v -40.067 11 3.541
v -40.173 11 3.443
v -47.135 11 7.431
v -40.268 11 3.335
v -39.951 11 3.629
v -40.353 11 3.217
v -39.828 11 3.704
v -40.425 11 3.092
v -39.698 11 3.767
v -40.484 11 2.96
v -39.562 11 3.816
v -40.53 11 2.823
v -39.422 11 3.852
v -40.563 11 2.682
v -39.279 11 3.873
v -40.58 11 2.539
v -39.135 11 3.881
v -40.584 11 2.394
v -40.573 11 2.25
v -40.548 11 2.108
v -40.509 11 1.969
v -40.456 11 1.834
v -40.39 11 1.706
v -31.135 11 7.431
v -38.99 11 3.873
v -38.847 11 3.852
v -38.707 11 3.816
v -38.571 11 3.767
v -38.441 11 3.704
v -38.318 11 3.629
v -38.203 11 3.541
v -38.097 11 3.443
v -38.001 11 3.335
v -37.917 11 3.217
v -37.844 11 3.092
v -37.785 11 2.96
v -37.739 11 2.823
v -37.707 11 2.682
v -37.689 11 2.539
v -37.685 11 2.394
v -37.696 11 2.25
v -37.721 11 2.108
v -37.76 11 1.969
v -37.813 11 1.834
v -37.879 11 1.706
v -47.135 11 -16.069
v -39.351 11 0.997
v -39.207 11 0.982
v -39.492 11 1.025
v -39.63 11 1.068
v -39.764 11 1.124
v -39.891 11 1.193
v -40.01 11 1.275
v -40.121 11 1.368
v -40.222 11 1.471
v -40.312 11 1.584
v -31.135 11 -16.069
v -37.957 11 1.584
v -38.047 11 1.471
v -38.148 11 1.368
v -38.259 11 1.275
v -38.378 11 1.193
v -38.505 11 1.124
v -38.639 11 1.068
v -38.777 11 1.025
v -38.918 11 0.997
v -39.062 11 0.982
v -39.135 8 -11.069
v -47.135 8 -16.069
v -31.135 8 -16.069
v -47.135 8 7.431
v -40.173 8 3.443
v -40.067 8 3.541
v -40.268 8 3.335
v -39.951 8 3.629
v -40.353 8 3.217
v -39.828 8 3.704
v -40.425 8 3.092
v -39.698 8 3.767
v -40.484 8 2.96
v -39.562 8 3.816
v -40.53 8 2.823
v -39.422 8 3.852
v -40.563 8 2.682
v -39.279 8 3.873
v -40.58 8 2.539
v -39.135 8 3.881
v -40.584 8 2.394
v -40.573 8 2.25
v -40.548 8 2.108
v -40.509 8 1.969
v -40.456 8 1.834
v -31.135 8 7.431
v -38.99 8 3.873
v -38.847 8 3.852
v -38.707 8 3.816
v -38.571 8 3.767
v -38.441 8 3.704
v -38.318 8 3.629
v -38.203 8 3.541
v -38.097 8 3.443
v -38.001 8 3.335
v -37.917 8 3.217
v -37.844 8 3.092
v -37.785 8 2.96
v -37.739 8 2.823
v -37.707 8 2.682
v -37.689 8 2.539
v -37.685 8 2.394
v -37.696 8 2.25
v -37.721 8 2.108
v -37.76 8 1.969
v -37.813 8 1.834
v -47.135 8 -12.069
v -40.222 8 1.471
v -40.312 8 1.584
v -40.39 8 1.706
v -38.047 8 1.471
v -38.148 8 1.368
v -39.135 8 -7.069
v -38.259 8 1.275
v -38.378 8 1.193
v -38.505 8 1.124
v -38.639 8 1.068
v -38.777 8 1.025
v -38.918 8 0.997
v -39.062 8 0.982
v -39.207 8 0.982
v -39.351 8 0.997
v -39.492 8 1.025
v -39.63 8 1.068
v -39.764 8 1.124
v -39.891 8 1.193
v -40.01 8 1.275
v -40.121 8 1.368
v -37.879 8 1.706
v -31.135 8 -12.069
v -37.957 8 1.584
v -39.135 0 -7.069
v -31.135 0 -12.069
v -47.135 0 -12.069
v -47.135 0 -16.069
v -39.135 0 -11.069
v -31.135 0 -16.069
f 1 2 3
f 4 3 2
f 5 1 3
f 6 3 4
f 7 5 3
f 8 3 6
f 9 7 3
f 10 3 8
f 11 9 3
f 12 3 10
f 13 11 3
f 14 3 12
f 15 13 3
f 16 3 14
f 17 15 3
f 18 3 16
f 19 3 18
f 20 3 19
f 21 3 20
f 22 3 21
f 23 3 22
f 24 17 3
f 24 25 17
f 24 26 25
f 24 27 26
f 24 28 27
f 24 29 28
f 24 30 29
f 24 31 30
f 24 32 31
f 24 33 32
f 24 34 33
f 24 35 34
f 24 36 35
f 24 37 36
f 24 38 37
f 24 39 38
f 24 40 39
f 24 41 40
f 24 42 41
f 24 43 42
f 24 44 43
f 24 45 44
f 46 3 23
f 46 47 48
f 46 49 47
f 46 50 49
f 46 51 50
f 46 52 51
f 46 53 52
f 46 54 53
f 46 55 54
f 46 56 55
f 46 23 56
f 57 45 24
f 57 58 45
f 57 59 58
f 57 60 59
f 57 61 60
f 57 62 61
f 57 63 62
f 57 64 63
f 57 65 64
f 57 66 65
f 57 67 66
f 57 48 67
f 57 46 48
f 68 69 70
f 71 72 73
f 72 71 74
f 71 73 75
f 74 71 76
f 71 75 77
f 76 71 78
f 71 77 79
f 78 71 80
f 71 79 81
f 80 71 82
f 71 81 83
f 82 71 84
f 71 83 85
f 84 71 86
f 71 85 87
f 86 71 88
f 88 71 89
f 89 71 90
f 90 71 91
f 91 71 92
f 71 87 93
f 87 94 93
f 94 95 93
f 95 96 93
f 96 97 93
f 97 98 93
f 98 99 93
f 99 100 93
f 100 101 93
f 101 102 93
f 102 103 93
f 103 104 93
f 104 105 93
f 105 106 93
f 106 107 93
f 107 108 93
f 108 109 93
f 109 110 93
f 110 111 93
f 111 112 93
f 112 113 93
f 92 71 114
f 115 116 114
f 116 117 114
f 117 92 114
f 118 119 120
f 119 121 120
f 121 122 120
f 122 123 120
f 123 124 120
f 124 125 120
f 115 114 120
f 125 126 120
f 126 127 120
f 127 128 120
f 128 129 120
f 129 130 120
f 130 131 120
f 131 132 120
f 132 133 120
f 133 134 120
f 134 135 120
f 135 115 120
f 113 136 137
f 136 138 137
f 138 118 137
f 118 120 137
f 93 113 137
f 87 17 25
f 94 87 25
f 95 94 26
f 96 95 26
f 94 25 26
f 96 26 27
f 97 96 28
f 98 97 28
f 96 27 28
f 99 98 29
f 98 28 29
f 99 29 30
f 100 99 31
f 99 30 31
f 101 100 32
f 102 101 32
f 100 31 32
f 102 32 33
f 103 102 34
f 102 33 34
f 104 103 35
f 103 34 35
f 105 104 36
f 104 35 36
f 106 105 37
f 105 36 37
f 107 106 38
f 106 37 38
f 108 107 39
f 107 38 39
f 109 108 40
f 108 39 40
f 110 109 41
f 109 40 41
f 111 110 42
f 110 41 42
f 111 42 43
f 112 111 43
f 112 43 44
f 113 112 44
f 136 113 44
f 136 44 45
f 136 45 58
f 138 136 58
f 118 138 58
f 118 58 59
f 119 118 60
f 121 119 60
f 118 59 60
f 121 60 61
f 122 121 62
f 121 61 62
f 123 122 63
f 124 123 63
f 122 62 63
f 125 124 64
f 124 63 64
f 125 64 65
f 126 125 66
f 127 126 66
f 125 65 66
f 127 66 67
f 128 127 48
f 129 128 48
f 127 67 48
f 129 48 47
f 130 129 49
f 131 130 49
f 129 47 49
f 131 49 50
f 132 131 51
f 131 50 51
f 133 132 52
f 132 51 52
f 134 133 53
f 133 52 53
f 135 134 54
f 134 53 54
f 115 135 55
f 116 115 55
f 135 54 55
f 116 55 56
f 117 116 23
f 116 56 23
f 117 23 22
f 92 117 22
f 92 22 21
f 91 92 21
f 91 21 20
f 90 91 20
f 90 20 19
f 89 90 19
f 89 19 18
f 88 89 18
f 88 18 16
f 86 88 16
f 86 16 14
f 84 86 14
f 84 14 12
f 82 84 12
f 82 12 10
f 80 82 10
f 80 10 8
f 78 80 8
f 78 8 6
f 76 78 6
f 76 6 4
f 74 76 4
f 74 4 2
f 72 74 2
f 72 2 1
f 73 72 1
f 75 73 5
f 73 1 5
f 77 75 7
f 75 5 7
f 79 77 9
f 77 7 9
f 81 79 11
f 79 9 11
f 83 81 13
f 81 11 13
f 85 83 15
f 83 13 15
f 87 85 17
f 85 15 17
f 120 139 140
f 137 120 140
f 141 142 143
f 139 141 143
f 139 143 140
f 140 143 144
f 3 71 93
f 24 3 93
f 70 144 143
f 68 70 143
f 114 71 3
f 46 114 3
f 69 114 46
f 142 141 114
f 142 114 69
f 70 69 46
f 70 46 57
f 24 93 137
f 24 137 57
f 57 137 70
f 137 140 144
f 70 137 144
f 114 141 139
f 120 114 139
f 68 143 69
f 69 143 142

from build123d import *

# Parameters (mm, degrees)
BOSS_EXTRUDE1_DEPTH = 8
SKETCH2_W           = 16
SKETCH2_H           = 23.5
BOSS_EXTRUDE2_DEPTH = 3
SKETCH3_R           = 1.45
CUT_EXTRUDE1_DEPTH  = 3


with BuildPart() as part:
    # Sketch1 → Boss-Extrude1 (new body)
    with BuildSketch(Plane(origin=(0, 0, 0), x_dir=(1, 0, 0), z_dir=(0, 1, 0))):
        Polygon((-47.134549376, 16.069493776), (-47.134549376, 12.069493776), (-39.134549376, 7.069493776), (-31.134549376, 12.069493776), (-31.134549376, 16.069493776), (-39.134549376, 11.069493776), align=None)
    extrude(amount=BOSS_EXTRUDE1_DEPTH)

    # Sketch2 → Boss-Extrude2 (add)
    with BuildSketch(Plane(origin=(0, 8, 0), x_dir=(1, 0, 0), z_dir=(0, 1, 0))):
        with Locations((-39.134549376, 4.319493776)):
            Rectangle(SKETCH2_W, SKETCH2_H)
    extrude(amount=BOSS_EXTRUDE2_DEPTH)

    # Sketch3 → Cut-Extrude1 (cut)
    with BuildSketch(Plane(origin=(0, 11, 0), x_dir=(1, 0, 0), z_dir=(0, 1, 0))):
        with Locations(Location((-39.134549376, -2.430506224, 0), (0, 0, 270))):
            Circle(SKETCH3_R)
    extrude(amount=-CUT_EXTRUDE1_DEPTH, mode=Mode.SUBTRACT)


solid = part.part
